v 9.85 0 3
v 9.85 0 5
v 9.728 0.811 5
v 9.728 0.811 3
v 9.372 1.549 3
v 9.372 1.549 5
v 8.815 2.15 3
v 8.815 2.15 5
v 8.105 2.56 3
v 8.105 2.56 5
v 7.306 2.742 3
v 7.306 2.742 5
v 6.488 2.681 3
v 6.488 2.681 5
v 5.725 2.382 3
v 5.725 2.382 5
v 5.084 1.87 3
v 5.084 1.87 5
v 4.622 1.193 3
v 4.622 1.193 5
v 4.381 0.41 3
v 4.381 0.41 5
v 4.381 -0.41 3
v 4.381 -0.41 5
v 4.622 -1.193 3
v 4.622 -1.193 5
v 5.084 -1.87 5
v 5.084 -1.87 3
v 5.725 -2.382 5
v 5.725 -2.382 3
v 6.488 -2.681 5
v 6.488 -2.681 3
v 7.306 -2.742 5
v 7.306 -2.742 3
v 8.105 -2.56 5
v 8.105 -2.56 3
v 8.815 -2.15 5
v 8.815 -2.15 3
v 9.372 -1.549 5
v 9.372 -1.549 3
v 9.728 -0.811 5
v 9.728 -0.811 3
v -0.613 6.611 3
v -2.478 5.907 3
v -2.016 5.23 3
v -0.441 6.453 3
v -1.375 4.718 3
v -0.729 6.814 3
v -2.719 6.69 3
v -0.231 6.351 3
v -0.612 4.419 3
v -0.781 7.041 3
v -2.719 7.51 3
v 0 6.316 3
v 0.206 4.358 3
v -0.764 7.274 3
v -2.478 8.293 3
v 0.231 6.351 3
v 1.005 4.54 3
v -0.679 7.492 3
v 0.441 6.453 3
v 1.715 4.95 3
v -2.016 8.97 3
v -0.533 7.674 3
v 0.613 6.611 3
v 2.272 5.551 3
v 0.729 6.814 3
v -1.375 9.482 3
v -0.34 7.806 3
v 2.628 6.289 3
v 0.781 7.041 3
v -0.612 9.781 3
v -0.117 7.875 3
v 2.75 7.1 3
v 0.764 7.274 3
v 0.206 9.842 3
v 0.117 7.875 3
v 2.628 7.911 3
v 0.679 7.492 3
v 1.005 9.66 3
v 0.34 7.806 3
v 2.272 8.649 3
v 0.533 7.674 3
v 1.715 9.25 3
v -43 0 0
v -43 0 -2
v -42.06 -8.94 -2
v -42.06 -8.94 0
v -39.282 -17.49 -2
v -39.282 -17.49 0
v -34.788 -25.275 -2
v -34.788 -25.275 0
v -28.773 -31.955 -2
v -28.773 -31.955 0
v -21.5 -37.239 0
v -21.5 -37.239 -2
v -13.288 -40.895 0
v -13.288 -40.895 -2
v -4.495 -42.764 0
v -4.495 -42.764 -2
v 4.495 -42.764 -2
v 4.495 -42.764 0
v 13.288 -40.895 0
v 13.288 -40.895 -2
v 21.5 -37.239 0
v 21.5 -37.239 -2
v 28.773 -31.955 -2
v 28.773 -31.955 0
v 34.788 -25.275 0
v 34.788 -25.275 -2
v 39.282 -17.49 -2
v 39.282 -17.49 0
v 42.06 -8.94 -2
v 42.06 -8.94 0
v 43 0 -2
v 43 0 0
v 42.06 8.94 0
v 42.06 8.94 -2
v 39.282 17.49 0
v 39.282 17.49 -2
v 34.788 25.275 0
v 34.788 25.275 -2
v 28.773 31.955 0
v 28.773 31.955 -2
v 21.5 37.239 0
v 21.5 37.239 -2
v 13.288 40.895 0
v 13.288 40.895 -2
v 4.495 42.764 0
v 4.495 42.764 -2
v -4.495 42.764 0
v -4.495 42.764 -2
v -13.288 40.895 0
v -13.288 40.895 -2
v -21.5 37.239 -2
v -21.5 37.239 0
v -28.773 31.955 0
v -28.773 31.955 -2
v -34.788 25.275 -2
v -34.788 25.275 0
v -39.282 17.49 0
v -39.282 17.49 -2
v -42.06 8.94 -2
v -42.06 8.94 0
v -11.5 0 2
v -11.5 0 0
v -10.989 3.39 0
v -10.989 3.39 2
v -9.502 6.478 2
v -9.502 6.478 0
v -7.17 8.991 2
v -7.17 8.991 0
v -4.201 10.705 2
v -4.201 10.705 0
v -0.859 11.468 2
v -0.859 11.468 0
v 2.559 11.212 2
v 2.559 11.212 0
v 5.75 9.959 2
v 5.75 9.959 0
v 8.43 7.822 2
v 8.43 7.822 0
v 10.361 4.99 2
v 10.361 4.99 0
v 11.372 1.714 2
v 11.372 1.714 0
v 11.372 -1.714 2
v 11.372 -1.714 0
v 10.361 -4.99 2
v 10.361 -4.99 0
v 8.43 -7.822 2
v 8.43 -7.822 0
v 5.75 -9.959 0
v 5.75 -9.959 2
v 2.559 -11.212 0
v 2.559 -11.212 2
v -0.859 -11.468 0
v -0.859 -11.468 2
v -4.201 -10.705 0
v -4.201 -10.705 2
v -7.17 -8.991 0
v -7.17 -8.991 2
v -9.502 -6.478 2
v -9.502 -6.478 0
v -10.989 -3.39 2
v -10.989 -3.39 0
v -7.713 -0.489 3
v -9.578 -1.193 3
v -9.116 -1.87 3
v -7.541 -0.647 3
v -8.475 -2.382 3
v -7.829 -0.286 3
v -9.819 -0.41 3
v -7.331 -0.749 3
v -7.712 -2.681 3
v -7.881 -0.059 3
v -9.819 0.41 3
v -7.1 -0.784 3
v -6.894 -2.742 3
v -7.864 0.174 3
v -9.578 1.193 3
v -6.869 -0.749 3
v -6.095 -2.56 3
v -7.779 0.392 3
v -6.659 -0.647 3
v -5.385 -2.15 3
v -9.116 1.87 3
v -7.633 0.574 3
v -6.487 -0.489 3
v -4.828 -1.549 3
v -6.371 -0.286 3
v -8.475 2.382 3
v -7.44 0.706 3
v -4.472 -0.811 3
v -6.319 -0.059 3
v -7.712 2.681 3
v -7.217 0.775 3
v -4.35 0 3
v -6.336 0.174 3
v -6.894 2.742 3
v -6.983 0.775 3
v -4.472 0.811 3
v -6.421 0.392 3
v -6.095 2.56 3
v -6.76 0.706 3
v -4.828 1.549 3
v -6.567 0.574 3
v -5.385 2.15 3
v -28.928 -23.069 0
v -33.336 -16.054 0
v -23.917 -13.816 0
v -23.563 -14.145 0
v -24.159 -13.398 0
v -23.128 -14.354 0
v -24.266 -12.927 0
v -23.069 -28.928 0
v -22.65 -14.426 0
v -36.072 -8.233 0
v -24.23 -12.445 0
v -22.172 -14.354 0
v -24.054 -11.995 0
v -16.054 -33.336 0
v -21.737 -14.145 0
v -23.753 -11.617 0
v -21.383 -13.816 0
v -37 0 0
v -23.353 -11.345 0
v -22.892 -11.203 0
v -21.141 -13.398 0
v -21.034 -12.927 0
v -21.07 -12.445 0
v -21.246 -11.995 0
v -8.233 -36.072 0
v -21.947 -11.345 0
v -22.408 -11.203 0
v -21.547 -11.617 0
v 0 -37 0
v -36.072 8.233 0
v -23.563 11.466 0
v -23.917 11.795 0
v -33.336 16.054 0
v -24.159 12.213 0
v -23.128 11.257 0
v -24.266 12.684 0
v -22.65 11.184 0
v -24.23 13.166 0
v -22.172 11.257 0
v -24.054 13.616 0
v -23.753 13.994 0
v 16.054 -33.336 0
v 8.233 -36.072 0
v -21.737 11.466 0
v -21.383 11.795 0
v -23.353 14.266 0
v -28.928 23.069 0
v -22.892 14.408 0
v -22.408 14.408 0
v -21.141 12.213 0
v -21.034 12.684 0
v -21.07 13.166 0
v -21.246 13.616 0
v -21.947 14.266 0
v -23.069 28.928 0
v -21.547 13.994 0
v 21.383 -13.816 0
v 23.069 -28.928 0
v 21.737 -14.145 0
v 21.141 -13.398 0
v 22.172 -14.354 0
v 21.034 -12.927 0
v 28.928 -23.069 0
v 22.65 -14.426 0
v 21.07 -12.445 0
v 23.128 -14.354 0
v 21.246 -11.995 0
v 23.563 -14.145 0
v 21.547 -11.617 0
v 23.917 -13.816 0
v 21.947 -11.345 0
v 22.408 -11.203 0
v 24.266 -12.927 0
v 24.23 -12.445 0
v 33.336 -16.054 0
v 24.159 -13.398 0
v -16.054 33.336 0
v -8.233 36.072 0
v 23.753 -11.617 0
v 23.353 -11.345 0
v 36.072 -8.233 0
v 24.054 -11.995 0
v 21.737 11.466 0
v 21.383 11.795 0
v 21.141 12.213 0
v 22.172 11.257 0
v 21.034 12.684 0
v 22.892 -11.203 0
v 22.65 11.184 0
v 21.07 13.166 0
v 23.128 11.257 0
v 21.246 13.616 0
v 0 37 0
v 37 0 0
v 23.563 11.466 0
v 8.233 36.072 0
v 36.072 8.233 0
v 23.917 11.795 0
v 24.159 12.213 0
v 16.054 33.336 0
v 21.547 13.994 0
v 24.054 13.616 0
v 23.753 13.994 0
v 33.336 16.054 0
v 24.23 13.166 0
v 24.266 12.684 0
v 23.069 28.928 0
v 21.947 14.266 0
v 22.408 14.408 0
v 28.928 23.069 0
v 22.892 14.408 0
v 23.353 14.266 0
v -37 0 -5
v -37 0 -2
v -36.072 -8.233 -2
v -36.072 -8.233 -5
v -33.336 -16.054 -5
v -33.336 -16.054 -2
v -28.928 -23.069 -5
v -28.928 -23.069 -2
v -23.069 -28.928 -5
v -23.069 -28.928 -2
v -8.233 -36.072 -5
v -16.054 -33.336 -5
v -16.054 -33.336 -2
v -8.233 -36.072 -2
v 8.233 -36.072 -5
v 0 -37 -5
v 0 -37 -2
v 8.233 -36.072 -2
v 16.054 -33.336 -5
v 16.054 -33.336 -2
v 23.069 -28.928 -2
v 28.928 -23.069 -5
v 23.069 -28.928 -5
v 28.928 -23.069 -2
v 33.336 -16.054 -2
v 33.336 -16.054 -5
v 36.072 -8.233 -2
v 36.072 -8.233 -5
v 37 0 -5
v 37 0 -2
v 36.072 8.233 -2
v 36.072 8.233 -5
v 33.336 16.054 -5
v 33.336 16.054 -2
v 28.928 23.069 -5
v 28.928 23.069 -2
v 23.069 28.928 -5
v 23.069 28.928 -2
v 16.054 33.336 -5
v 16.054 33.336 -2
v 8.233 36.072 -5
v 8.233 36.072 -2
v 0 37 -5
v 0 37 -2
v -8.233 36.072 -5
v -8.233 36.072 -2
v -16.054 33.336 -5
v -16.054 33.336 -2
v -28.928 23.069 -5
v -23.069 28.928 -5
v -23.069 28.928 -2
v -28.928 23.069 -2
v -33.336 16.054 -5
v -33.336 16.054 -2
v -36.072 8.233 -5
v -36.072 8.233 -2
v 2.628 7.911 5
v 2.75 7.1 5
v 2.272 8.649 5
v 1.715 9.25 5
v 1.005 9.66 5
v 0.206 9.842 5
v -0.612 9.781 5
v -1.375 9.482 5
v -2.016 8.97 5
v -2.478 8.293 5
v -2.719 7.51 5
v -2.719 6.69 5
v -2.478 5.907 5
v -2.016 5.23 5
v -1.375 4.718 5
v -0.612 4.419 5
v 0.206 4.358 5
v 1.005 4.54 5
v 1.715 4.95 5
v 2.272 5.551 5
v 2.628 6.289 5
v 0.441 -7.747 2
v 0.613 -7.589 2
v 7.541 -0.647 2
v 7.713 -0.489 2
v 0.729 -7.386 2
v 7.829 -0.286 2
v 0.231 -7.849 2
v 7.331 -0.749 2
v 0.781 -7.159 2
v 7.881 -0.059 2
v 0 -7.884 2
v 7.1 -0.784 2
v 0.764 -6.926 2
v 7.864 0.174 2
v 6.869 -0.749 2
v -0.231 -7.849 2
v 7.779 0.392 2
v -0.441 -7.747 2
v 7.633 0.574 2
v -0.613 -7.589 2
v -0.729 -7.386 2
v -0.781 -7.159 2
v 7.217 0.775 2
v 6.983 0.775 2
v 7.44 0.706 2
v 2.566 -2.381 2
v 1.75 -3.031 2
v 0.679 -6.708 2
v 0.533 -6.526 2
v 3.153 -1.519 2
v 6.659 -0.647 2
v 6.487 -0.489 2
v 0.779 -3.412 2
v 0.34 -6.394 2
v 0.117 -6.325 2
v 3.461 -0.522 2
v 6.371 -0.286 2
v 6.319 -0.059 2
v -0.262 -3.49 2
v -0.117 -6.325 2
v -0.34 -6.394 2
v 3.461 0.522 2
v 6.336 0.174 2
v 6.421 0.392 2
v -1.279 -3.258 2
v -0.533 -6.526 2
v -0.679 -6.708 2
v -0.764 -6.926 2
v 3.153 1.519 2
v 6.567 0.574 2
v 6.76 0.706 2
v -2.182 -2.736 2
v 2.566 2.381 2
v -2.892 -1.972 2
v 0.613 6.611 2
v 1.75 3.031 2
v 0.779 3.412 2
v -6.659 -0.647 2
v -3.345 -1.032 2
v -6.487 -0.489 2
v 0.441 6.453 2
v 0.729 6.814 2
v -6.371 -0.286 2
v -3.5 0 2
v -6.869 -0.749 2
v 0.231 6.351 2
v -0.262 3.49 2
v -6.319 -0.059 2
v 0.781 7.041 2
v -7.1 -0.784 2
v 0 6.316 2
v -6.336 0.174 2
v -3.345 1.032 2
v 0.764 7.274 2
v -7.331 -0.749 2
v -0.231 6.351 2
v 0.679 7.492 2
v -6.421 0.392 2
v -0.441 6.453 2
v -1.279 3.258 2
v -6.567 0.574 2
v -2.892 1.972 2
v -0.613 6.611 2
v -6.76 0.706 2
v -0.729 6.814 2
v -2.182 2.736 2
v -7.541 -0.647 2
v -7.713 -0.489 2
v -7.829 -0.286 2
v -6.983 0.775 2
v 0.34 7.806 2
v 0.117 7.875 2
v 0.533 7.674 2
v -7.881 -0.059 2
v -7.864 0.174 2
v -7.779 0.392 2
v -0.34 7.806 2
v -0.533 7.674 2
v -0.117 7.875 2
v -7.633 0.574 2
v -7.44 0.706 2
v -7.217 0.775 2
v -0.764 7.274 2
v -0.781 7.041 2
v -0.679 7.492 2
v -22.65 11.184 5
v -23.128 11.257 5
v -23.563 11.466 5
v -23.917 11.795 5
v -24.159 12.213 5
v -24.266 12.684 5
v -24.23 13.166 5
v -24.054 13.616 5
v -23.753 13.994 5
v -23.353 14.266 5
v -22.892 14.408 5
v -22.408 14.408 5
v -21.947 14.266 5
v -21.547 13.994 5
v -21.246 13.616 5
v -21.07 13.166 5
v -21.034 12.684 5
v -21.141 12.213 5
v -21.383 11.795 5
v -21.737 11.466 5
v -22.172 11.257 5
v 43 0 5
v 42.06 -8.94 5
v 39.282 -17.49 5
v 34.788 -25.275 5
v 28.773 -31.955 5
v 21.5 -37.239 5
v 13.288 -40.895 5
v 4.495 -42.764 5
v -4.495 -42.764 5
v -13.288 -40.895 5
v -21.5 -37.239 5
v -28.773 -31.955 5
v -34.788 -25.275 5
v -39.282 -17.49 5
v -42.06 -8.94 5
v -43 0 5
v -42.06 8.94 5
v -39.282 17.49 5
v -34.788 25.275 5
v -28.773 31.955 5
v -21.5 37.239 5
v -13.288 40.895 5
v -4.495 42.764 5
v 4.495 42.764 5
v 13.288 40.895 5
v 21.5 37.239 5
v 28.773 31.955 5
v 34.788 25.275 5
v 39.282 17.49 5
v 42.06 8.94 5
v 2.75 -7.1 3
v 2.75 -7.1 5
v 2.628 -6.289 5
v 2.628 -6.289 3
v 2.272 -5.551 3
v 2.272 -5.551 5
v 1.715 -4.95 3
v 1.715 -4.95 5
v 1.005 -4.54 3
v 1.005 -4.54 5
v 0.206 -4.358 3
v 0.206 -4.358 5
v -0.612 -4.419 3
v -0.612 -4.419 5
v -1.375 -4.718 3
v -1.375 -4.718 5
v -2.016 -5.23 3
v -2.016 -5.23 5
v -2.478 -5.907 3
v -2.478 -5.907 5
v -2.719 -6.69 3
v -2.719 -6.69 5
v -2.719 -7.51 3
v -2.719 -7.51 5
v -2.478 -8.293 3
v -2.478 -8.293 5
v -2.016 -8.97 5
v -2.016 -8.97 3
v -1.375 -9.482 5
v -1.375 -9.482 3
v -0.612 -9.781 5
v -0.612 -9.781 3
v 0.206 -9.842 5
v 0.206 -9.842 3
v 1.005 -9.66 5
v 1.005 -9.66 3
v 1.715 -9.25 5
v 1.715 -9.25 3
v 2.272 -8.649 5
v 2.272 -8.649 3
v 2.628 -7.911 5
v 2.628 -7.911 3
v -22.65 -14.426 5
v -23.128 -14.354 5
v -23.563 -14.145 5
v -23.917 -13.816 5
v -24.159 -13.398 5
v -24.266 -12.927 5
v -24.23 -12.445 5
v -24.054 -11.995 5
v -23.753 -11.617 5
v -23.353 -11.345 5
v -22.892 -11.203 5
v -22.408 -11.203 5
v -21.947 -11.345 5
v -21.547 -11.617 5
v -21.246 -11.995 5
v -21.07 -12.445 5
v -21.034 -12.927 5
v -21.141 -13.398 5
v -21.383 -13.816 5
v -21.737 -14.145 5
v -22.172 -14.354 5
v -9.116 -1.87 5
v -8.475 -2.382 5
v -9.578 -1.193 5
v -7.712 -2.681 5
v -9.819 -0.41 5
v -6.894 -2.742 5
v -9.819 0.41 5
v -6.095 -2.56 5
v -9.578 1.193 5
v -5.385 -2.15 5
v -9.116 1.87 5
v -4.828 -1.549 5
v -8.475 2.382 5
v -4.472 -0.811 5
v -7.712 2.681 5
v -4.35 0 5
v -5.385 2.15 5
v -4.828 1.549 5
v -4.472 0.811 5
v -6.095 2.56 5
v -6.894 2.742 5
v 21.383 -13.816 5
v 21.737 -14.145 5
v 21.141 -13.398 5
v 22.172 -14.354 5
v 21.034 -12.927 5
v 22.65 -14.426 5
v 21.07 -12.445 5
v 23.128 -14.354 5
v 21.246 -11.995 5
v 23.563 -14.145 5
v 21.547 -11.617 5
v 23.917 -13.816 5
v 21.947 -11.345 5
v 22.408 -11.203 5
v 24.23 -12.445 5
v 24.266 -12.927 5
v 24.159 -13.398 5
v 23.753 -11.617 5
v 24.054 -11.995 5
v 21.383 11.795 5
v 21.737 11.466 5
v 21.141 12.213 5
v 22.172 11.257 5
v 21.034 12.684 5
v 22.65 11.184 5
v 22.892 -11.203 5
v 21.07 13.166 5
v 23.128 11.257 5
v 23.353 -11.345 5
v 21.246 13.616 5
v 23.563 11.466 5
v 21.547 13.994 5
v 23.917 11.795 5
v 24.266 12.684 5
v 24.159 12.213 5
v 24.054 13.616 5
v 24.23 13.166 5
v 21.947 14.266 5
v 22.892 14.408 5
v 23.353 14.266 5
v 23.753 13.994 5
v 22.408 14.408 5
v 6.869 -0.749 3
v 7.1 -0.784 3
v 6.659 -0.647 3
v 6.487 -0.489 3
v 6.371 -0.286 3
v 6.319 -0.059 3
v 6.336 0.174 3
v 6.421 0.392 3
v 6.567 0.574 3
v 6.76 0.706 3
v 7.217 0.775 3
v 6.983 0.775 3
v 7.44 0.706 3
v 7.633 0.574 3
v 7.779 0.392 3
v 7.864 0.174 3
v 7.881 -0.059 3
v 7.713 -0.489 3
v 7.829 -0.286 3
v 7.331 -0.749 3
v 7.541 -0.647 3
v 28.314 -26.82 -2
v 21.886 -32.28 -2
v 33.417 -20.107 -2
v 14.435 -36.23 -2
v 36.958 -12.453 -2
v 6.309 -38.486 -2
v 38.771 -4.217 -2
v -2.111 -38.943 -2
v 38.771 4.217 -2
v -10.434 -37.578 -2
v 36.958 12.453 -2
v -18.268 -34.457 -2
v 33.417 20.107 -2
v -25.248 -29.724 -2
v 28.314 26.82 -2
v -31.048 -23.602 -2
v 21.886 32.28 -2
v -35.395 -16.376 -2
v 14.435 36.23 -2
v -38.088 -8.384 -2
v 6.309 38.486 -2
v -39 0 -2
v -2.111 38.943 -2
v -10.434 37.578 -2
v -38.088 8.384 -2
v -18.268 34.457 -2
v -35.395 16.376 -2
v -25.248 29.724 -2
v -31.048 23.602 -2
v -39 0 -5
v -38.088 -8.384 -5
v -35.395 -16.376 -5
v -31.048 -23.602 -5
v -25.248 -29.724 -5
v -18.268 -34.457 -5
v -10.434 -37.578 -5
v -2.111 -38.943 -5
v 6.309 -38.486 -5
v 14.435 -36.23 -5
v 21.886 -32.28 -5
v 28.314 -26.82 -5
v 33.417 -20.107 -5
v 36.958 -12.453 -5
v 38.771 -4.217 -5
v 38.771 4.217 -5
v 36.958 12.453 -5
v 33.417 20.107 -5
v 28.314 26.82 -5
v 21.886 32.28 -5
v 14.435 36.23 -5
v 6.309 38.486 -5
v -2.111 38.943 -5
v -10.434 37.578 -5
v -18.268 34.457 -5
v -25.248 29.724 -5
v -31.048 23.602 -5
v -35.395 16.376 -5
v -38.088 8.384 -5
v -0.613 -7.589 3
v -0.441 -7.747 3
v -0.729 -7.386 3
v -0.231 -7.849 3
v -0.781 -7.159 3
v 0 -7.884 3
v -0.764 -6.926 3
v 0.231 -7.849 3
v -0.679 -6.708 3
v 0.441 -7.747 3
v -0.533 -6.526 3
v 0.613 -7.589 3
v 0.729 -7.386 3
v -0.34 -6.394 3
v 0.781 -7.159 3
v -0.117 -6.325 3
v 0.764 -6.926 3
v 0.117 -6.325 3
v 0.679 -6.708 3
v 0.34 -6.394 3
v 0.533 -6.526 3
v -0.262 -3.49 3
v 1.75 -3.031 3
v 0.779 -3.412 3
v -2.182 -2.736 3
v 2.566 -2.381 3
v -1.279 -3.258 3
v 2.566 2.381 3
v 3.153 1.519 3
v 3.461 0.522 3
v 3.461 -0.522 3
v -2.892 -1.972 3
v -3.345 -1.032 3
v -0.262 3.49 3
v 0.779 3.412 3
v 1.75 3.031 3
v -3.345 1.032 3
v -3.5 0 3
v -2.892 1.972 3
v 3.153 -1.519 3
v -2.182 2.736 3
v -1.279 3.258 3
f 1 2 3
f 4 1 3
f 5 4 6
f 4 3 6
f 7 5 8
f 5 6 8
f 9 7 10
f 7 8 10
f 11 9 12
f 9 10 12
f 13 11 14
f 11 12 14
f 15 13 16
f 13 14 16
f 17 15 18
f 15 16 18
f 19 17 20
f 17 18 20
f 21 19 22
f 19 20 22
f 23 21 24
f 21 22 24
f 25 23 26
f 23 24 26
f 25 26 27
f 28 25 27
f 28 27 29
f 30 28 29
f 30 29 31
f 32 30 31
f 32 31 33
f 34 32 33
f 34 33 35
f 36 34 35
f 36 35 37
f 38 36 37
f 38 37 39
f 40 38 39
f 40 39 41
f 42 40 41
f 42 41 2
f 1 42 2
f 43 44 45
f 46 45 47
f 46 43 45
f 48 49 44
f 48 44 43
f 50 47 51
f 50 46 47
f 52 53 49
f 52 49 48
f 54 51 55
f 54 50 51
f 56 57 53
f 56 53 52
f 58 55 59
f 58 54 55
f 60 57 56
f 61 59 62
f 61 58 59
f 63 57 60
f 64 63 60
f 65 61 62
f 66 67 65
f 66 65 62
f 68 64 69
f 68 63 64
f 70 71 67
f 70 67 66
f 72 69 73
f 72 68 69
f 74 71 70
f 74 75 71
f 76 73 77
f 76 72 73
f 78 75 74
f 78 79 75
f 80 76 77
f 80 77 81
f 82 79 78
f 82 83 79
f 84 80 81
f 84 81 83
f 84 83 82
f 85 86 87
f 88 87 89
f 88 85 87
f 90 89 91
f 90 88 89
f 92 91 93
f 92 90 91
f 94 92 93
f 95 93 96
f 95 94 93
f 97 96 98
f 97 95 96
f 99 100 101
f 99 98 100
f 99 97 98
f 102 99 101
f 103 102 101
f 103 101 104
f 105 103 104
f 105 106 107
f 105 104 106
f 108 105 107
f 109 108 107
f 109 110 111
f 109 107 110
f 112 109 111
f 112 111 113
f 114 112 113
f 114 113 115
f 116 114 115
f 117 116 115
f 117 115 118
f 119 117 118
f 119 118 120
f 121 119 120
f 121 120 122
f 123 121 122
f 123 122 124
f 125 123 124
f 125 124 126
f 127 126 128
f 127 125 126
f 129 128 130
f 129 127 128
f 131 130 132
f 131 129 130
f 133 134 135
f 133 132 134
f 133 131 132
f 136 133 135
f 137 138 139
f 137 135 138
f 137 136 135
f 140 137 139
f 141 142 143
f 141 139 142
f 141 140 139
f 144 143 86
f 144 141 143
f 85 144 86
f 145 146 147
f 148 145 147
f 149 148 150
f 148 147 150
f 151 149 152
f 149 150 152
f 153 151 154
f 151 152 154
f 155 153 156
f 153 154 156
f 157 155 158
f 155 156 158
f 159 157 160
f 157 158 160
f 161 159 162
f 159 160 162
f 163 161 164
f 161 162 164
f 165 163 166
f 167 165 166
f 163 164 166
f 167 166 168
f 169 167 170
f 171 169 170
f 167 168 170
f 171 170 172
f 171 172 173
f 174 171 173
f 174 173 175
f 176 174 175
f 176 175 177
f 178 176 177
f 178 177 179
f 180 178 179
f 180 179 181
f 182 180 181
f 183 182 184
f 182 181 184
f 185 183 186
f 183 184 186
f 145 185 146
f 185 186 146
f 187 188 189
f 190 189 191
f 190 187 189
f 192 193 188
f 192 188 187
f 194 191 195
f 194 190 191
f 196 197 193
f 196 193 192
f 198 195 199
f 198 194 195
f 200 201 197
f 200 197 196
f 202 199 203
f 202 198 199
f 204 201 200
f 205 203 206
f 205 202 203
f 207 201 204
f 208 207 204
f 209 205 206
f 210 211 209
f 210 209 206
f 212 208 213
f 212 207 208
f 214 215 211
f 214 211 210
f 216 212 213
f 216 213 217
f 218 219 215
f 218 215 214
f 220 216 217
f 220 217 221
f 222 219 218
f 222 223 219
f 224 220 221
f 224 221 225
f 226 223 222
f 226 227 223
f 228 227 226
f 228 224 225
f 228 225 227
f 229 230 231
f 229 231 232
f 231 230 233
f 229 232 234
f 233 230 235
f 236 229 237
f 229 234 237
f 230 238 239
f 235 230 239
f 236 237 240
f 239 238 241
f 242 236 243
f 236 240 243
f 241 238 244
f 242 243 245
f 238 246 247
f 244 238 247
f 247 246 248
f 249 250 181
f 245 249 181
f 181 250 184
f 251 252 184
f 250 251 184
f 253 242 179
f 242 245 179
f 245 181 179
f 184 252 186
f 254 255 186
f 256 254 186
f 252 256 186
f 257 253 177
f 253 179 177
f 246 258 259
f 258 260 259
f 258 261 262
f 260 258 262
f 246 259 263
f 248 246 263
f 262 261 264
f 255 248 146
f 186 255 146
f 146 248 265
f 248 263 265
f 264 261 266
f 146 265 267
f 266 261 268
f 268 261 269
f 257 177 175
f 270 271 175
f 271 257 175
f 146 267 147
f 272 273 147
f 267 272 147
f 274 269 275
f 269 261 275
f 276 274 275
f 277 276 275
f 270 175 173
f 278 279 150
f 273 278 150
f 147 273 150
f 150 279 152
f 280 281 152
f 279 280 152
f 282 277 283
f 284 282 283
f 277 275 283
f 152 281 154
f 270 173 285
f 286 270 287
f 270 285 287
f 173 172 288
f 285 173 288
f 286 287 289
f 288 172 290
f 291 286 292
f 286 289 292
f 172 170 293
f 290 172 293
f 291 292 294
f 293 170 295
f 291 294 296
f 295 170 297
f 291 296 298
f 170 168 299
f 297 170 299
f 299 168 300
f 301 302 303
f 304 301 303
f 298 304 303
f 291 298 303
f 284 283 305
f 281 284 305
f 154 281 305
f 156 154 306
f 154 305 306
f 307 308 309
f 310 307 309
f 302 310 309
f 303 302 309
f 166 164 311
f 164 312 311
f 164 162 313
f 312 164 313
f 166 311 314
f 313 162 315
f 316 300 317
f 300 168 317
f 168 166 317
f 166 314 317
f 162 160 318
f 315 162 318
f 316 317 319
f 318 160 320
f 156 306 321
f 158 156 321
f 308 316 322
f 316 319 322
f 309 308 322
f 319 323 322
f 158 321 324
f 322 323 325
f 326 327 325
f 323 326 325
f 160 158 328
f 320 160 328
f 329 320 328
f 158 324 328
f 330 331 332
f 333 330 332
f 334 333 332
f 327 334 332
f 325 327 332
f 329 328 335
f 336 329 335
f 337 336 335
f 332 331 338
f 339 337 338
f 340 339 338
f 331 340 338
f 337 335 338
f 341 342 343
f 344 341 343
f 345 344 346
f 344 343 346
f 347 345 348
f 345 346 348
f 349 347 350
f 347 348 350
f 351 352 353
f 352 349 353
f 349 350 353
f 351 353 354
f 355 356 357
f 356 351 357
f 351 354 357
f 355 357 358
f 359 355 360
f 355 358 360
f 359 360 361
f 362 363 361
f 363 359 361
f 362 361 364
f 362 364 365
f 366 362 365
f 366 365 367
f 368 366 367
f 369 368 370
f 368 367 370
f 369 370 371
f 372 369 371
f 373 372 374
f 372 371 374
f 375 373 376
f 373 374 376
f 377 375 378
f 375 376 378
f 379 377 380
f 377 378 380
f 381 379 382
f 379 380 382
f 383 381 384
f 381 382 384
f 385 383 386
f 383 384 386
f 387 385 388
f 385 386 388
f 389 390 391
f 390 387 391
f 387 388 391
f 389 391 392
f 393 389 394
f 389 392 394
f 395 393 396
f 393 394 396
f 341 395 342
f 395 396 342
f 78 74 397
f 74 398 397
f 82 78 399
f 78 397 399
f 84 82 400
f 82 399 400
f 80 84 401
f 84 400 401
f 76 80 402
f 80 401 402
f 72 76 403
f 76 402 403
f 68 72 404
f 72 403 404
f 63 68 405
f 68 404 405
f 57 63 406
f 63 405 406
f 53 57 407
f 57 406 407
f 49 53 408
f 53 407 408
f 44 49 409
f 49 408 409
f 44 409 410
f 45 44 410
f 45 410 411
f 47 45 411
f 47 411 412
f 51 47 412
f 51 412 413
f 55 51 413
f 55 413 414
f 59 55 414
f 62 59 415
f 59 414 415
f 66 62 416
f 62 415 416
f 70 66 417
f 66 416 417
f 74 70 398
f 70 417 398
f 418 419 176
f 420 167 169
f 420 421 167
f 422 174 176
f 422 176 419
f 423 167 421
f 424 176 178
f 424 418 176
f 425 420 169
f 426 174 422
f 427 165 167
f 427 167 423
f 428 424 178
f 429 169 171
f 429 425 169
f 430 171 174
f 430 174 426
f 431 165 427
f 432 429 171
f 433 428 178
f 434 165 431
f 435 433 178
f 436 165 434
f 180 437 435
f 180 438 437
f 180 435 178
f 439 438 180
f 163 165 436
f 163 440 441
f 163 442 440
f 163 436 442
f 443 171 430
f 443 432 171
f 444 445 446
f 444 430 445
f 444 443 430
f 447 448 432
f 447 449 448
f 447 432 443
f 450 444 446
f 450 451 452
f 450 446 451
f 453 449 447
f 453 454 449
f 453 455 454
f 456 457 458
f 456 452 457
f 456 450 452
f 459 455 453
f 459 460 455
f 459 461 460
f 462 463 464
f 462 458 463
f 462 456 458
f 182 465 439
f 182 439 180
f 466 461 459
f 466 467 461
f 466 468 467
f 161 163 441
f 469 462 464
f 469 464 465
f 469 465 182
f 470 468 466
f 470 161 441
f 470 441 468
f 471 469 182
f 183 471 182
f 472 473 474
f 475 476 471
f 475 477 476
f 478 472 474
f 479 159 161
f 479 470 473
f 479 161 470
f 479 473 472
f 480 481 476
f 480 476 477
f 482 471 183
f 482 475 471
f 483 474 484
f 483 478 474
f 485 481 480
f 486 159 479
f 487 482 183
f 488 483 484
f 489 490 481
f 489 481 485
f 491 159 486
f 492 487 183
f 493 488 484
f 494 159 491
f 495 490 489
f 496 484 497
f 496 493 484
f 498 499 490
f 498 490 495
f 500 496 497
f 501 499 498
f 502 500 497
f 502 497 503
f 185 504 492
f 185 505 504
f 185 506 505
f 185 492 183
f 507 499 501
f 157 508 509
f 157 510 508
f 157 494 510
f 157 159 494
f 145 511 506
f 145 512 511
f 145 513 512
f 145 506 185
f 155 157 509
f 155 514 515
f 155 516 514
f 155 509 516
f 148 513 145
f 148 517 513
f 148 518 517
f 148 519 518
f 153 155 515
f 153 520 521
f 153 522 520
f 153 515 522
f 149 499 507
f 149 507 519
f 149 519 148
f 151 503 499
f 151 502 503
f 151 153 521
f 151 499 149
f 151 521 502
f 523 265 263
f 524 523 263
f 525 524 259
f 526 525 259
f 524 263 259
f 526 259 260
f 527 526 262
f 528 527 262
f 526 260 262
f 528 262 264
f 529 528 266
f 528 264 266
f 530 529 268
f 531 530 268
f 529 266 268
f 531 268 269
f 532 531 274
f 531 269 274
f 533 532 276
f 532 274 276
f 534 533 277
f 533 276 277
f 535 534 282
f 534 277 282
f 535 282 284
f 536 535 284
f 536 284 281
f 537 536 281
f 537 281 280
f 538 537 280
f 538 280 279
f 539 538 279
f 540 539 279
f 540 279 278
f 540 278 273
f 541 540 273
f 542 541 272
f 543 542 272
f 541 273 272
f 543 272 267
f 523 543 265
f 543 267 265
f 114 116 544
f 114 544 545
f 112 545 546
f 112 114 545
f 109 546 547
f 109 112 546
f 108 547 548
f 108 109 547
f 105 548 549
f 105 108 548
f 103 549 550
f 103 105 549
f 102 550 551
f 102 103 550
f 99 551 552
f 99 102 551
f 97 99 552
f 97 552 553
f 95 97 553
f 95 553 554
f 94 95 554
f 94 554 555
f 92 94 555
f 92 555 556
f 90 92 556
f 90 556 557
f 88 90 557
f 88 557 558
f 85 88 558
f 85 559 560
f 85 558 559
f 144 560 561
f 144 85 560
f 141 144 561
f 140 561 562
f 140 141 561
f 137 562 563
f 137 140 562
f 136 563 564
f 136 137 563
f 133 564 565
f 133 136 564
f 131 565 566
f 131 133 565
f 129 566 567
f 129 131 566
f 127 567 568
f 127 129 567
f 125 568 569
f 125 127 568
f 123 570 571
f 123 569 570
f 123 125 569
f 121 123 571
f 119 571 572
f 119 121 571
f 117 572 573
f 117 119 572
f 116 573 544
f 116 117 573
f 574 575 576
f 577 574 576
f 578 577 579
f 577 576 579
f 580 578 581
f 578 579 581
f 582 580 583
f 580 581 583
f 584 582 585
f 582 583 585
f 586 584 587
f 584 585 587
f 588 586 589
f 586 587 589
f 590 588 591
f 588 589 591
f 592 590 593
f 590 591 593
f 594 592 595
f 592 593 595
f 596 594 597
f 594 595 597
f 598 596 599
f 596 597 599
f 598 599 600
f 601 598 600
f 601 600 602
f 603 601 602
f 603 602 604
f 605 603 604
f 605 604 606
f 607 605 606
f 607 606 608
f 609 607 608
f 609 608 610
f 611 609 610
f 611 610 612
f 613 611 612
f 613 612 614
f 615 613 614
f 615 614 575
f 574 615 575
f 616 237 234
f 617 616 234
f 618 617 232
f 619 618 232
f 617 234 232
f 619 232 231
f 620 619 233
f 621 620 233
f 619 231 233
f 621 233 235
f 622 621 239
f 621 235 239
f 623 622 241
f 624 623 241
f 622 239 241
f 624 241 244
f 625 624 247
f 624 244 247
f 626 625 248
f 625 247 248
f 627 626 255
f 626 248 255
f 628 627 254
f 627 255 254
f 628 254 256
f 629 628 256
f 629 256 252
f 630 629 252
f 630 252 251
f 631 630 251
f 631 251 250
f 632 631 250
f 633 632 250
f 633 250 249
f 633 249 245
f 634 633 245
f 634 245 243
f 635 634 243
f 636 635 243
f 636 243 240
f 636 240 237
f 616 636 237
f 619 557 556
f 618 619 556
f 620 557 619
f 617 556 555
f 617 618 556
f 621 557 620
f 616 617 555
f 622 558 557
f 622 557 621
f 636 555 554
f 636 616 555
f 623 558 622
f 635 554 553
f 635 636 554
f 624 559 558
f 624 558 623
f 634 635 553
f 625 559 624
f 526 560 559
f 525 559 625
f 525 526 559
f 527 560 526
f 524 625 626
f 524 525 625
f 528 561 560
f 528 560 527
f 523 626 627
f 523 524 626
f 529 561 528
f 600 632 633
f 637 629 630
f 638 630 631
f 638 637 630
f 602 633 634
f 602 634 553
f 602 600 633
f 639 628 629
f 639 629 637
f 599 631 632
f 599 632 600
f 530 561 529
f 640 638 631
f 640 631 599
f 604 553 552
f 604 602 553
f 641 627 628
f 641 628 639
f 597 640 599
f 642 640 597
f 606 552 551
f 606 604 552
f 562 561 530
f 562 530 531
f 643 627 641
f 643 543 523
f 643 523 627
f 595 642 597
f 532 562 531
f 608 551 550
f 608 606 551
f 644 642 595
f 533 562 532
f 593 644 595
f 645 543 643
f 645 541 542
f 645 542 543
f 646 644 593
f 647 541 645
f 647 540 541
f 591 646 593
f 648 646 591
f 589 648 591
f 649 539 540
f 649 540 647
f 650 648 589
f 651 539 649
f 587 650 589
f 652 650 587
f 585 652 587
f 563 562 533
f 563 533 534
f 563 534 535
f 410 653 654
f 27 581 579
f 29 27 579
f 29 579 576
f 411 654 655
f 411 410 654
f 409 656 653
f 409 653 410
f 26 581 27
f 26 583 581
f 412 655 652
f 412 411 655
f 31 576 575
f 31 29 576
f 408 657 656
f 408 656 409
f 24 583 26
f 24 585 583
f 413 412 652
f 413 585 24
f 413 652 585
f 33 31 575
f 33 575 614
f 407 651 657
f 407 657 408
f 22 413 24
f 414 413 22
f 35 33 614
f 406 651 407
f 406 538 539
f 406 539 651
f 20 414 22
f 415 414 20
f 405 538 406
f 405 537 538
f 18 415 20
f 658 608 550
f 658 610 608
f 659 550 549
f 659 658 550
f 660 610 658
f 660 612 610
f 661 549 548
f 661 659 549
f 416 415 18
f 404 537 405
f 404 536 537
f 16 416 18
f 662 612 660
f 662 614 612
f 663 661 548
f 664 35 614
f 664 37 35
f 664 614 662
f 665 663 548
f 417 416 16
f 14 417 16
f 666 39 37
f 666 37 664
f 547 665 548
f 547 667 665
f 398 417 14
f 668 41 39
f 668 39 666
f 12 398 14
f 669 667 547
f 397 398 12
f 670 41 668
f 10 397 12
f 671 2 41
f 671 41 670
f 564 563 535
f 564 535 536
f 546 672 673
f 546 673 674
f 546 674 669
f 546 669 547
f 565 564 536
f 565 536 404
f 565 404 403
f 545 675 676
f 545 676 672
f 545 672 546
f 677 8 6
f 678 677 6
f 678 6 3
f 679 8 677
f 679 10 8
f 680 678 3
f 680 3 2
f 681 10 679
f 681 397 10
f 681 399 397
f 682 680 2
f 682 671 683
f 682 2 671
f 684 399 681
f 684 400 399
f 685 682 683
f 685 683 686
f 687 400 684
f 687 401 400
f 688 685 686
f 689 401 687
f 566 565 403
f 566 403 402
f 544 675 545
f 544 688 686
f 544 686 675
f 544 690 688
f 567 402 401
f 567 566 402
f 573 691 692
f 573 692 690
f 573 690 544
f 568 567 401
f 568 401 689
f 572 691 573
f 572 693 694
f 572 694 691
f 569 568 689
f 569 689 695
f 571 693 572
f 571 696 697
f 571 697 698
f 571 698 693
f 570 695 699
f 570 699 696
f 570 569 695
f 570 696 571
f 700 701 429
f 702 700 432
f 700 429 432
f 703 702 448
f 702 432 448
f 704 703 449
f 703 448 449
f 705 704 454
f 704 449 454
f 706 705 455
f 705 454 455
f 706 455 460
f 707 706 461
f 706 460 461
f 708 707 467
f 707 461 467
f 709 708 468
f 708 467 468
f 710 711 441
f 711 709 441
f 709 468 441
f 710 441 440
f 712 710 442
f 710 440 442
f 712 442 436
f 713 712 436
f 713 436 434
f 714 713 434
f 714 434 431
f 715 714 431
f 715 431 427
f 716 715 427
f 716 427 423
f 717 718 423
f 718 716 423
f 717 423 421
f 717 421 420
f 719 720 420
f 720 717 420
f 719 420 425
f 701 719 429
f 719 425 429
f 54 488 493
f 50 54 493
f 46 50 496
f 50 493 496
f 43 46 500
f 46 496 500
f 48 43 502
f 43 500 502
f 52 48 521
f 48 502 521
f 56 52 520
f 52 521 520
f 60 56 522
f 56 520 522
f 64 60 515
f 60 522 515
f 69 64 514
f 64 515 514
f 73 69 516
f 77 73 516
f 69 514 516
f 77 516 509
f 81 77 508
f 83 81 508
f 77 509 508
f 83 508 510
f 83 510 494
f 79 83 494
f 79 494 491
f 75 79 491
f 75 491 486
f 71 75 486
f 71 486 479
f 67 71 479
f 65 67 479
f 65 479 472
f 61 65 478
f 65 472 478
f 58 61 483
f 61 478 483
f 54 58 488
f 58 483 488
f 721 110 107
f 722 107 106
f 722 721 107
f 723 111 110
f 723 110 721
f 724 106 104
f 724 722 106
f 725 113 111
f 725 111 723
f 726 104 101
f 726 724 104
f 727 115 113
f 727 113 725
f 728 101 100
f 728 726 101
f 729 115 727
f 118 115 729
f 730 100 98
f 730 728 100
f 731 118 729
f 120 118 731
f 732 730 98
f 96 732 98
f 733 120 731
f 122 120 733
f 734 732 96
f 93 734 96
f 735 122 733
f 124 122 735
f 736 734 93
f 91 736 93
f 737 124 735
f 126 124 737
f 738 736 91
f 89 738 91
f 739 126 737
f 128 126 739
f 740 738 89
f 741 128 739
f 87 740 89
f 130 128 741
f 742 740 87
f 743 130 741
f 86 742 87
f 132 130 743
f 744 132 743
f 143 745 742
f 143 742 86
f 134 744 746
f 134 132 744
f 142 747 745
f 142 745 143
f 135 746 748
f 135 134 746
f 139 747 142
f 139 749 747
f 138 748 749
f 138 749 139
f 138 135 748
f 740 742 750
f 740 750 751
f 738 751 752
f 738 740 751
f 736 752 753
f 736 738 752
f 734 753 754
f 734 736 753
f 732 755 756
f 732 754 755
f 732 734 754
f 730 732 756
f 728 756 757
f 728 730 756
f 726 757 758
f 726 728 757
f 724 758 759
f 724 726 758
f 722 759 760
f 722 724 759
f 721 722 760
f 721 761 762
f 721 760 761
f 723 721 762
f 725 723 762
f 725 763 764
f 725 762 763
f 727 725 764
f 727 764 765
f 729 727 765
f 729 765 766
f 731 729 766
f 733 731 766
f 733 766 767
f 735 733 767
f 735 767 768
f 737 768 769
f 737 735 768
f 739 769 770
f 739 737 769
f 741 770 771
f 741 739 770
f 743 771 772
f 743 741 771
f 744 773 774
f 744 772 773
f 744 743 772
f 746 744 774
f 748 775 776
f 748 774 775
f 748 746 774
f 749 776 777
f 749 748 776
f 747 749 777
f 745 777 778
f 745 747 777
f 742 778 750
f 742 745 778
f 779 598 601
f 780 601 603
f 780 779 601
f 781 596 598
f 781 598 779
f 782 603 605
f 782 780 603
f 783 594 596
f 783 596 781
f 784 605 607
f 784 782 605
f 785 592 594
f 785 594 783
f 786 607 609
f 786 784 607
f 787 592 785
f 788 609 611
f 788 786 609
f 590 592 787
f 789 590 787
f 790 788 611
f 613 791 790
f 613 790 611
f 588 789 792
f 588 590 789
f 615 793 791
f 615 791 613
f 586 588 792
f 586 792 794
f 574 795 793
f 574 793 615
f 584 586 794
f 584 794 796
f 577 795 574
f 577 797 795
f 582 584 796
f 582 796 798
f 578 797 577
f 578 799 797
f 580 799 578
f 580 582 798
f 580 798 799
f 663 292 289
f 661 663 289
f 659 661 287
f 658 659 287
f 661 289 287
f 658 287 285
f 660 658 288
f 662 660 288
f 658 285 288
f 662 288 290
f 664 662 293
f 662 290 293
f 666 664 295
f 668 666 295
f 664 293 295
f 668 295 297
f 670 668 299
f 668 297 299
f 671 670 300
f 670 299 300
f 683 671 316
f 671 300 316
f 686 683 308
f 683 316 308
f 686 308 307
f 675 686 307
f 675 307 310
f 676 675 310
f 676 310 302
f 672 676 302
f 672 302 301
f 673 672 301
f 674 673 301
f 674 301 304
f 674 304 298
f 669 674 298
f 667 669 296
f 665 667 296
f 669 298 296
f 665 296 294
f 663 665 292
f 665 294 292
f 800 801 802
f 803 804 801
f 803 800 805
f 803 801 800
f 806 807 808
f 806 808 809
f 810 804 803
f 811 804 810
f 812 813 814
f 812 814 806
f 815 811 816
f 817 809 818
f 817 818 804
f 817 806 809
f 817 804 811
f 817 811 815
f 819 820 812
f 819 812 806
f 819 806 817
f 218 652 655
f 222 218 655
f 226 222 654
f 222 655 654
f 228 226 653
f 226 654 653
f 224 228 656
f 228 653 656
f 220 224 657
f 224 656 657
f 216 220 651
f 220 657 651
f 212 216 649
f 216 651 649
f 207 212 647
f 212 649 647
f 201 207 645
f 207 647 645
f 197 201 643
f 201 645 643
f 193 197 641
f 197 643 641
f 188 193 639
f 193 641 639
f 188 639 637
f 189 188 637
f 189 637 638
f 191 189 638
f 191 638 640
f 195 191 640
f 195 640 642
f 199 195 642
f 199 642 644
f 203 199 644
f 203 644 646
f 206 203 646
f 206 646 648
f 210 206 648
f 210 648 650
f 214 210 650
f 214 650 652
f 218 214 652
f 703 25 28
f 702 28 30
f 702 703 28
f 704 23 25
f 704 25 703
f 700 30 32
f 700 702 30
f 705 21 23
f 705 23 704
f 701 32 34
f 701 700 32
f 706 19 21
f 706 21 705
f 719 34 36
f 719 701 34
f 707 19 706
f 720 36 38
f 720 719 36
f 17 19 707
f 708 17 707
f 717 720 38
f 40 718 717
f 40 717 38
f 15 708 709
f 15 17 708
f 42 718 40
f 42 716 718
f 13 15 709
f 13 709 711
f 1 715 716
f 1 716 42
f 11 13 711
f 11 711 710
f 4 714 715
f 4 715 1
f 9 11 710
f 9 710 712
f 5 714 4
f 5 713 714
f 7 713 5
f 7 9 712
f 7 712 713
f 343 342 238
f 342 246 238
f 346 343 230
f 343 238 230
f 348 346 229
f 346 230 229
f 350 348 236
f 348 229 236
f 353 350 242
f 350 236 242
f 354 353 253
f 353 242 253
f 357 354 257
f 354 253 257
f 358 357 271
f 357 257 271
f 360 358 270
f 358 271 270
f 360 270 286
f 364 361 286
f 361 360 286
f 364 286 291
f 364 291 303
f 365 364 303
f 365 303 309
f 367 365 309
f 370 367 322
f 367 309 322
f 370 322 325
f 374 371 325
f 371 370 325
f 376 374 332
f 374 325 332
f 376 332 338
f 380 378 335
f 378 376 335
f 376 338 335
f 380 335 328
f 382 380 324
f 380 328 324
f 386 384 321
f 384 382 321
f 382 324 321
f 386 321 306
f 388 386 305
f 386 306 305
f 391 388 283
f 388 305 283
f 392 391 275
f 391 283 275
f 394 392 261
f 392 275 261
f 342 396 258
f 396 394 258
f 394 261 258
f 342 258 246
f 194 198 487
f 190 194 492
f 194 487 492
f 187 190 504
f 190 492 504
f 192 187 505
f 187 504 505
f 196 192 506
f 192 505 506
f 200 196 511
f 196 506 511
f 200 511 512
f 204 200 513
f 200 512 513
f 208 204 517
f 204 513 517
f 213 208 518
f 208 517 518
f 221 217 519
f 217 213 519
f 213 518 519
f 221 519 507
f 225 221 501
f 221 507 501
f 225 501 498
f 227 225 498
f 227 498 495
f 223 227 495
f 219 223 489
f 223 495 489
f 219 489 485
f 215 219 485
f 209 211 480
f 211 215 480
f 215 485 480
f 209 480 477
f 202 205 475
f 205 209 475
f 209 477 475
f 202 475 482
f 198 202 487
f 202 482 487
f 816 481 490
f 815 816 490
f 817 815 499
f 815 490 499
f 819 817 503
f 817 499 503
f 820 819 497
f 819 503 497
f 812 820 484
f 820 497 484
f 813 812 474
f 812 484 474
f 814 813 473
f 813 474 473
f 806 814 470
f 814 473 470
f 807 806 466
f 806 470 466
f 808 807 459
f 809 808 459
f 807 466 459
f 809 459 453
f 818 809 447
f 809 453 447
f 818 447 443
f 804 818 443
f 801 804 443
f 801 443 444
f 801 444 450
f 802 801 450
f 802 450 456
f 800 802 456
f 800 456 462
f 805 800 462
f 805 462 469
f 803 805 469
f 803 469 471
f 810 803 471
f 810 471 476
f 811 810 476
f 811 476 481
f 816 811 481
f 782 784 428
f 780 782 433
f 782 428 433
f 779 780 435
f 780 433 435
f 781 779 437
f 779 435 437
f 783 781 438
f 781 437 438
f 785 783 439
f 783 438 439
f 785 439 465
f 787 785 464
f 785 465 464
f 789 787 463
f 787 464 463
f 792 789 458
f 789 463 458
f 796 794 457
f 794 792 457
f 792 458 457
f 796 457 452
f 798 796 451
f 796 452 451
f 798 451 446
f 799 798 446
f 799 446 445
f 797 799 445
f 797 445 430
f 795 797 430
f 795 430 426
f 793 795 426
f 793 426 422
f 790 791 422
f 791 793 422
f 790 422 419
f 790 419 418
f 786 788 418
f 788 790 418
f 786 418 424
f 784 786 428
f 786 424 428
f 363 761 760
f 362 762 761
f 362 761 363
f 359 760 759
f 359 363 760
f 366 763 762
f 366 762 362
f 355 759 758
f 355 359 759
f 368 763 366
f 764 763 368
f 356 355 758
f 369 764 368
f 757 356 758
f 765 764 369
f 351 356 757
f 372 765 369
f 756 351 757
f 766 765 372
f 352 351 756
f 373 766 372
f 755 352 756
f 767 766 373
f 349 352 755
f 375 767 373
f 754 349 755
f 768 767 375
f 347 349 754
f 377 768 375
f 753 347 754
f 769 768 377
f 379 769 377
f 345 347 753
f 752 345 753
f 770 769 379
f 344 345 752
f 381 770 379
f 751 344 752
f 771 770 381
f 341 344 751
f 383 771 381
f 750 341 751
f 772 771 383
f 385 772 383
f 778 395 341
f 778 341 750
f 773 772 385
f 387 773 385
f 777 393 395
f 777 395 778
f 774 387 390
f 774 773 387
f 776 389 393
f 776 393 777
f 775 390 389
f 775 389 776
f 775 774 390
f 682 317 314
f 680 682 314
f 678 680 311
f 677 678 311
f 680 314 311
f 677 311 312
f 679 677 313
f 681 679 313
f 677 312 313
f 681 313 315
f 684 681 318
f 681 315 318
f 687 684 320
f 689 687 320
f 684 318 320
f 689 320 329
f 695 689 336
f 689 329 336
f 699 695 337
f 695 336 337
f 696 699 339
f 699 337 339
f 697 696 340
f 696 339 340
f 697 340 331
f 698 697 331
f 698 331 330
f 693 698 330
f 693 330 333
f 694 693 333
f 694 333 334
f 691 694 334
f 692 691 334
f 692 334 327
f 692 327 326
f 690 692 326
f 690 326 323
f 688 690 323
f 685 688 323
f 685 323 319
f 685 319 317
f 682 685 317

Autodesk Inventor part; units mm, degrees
ref_plane "YZ Plane" through (0, 0, 0) normal (1, 0, 0) x (0, 1, 0)
ref_plane "XZ Plane" through (0, 0, 0) normal (0, 1, 0) x (-1, 0, 0)
ref_plane "XY Plane" through (0, 0, 0) normal (0, 0, 1) x (1, 0, 0)
sketch "Szkic1" plane through (0, 0, 0) normal (0, 0, 1) x (1, 0, 0)
  circle A0 centre (0, 0) radius 10.75
  circle A1 centre (0, 0) radius 11.25
  circle A2 centre (0, 0) radius 43
  dimension "d0" = 21.5
  dimension "d1" = 0.5
  dimension "d2" = 86
extrude "Wyciągnięcie proste1" add sketch "Szkic1" along normal blind 10 contours A0 | A1 | A2
sketch "Szkic2" plane through (0, 0, 10) normal (0, 0, 1) x (1, 0, 0)
  circle A0 centre (0, 0) radius 3.5
  point P0 (7.1, 0)
  point P1 (0, 7.1)
  point P2 (-7.1, 0)
  point P3 (0, -7.1)
  dimension "d5" = 7.1
  dimension "d6" = 7.1
  dimension "d7" = 7.1
  dimension "d8" = 7.1
  dimension "d9" = 7
hole "Otwór1" at (7.1, 0, 10) at (0, 7.1, 10) at (-7.1, 0, 10) at (0, -7.1, 10) direction (0, 0, -1) diameter 1.567 end through all thread size "M2x0.4" designation "M2" class "6H" standard "GB Metric profile"
sketch "Szkic3" plane through (0, 0, 0) normal (0, 0, -1) x (-1, 0, 0)
  circle A0 centre (0, 0) radius 11.5
  dimension "d17" = 23
extrude "Wyciągnięcie proste2" cut sketch "Szkic3" against normal blind 2
sketch "Szkic4" plane through (0, 0, 2) normal (0, 0, -1) x (-1, 0, 0)
  circle A0 centre (0, 0) radius 3.5
  dimension "d20" = 7
extrude "Wyciągnięcie proste3" cut sketch "Szkic4" against normal blind 1
sketch "Szkic5" plane through (0, 0, 10) normal (0, 0, 1) x (1, 0, 0)
  circle A0 centre (-7.1, 0) radius 0.7835 projected
  circle A1 centre (7.1, 0) radius 0.7835 projected
  circle A2 centre (0, 7.1) radius 0.7835 projected
  circle A3 centre (0, -7.1) radius 0.7835 projected
  circle A4 centre (0, 0) radius 43 projected
extrude "Wyciągnięcie proste4" cut sketch "Szkic5" against normal blind 5
sketch "Szkic6" plane through (0, 0, 5) normal (0, 0, 1) x (1, 0, 0)
  circle A0 centre (0, -7.1) radius 0.7835 projected
  circle A1 centre (7.1, 0) radius 0.7835 projected
  circle A2 centre (-7.1, 0) radius 0.7835 projected
  circle A3 centre (0, 7.1) radius 0.7835 projected
  circle A4 centre (0, -7.1) radius 2.75
  circle A5 centre (-7.1, 0) radius 0.7835 projected
  circle A6 centre (-7.1, 0) radius 2.75
  circle A7 centre (0, 7.1) radius 2.75
  circle A8 centre (7.1, 0) radius 0.7835 projected
  circle A9 centre (7.1, 0) radius 2.75
  point P0 (0, 0)
  dimension "d25" = 5.5
  dimension "d26" = 5.5
  dimension "d27" = 5.5
  dimension "d28" = 5.5
extrude "Wyciągnięcie proste5" cut sketch "Szkic6" against normal blind 2 contours A3 | A4 | A6 | A7 | A9
sketch "Szkic9" plane through (0, 0, 0) normal (0, 0, -1) x (-1, 0, 0)
  circle A0 centre (0, 0) radius 11.5 projected
  circle A1 centre (0, 0) radius 43 projected
  circle A2 centre (0, 0) radius 37
  dimension "d36" = 6
extrude "Wyciągnięcie proste7" add sketch "Szkic9" along normal blind 2 contours A1
sketch "Szkic10" plane through (0, 0, -2) normal (0, 0, -1) x (-1, 0, 0)
  circle A0 centre (0, 0) radius 43 projected
  circle A1 centre (0, 0) radius 37 projected
  circle A2 centre (0, 0) radius 39
  dimension "d39" = 2
extrude "Wyciągnięcie proste8" add sketch "Szkic10" along normal blind 3 contours A2
sketch "Szkic12" plane through (0, 0, 5) normal (0, 0, 1) x (1, 0, 0)
  line L0 (-30.65, -20.8055) -> (30.65, -20.8055)
  line L1 (30.65, -20.8055) -> (30.65, 20.8055)
  line L2 (30.65, 20.8055) -> (-30.65, 20.8055)
  line L3 (-30.65, 20.8055) -> (-30.65, -20.8055)
  line L4 (-30.65, -20.8055) -> (30.65, 20.8055) construction
  line L5 (30.65, -20.8055) -> (-30.65, 20.8055) construction
  point P0 (0, 0)
  point P1 (-22.65, 12.8055)
  point P2 (-22.65, -12.8055)
  point P3 (22.65, 12.8055)
  point P4 (22.65, -12.8055)
  dimension "d59" = 61.3
  dimension "d60" = 41.611
  dimension "d61" = 8
  dimension "d62" = 8
  dimension "d63" = 8
  dimension "d64" = 8
  dimension "d65" = 8
  dimension "d66" = 8
  dimension "d67" = 8
  dimension "d68" = 8
hole "Otwór3" at (-22.65, 12.8055, 5) at (-22.65, -12.8055, 5) at (22.65, 12.8055, 5) at (22.65, -12.8055, 5) direction (0, 0, -1) diameter 3.242 end through all thread size "M4x0.7" designation "M4" class "6H" standard "GB Metric profile"
equation "\"d6\" = d5"
equation "\"d7\" = d6"
equation "\"d8\" = d6"
properties part number "Podstawa2_Drukowanie 3D"
